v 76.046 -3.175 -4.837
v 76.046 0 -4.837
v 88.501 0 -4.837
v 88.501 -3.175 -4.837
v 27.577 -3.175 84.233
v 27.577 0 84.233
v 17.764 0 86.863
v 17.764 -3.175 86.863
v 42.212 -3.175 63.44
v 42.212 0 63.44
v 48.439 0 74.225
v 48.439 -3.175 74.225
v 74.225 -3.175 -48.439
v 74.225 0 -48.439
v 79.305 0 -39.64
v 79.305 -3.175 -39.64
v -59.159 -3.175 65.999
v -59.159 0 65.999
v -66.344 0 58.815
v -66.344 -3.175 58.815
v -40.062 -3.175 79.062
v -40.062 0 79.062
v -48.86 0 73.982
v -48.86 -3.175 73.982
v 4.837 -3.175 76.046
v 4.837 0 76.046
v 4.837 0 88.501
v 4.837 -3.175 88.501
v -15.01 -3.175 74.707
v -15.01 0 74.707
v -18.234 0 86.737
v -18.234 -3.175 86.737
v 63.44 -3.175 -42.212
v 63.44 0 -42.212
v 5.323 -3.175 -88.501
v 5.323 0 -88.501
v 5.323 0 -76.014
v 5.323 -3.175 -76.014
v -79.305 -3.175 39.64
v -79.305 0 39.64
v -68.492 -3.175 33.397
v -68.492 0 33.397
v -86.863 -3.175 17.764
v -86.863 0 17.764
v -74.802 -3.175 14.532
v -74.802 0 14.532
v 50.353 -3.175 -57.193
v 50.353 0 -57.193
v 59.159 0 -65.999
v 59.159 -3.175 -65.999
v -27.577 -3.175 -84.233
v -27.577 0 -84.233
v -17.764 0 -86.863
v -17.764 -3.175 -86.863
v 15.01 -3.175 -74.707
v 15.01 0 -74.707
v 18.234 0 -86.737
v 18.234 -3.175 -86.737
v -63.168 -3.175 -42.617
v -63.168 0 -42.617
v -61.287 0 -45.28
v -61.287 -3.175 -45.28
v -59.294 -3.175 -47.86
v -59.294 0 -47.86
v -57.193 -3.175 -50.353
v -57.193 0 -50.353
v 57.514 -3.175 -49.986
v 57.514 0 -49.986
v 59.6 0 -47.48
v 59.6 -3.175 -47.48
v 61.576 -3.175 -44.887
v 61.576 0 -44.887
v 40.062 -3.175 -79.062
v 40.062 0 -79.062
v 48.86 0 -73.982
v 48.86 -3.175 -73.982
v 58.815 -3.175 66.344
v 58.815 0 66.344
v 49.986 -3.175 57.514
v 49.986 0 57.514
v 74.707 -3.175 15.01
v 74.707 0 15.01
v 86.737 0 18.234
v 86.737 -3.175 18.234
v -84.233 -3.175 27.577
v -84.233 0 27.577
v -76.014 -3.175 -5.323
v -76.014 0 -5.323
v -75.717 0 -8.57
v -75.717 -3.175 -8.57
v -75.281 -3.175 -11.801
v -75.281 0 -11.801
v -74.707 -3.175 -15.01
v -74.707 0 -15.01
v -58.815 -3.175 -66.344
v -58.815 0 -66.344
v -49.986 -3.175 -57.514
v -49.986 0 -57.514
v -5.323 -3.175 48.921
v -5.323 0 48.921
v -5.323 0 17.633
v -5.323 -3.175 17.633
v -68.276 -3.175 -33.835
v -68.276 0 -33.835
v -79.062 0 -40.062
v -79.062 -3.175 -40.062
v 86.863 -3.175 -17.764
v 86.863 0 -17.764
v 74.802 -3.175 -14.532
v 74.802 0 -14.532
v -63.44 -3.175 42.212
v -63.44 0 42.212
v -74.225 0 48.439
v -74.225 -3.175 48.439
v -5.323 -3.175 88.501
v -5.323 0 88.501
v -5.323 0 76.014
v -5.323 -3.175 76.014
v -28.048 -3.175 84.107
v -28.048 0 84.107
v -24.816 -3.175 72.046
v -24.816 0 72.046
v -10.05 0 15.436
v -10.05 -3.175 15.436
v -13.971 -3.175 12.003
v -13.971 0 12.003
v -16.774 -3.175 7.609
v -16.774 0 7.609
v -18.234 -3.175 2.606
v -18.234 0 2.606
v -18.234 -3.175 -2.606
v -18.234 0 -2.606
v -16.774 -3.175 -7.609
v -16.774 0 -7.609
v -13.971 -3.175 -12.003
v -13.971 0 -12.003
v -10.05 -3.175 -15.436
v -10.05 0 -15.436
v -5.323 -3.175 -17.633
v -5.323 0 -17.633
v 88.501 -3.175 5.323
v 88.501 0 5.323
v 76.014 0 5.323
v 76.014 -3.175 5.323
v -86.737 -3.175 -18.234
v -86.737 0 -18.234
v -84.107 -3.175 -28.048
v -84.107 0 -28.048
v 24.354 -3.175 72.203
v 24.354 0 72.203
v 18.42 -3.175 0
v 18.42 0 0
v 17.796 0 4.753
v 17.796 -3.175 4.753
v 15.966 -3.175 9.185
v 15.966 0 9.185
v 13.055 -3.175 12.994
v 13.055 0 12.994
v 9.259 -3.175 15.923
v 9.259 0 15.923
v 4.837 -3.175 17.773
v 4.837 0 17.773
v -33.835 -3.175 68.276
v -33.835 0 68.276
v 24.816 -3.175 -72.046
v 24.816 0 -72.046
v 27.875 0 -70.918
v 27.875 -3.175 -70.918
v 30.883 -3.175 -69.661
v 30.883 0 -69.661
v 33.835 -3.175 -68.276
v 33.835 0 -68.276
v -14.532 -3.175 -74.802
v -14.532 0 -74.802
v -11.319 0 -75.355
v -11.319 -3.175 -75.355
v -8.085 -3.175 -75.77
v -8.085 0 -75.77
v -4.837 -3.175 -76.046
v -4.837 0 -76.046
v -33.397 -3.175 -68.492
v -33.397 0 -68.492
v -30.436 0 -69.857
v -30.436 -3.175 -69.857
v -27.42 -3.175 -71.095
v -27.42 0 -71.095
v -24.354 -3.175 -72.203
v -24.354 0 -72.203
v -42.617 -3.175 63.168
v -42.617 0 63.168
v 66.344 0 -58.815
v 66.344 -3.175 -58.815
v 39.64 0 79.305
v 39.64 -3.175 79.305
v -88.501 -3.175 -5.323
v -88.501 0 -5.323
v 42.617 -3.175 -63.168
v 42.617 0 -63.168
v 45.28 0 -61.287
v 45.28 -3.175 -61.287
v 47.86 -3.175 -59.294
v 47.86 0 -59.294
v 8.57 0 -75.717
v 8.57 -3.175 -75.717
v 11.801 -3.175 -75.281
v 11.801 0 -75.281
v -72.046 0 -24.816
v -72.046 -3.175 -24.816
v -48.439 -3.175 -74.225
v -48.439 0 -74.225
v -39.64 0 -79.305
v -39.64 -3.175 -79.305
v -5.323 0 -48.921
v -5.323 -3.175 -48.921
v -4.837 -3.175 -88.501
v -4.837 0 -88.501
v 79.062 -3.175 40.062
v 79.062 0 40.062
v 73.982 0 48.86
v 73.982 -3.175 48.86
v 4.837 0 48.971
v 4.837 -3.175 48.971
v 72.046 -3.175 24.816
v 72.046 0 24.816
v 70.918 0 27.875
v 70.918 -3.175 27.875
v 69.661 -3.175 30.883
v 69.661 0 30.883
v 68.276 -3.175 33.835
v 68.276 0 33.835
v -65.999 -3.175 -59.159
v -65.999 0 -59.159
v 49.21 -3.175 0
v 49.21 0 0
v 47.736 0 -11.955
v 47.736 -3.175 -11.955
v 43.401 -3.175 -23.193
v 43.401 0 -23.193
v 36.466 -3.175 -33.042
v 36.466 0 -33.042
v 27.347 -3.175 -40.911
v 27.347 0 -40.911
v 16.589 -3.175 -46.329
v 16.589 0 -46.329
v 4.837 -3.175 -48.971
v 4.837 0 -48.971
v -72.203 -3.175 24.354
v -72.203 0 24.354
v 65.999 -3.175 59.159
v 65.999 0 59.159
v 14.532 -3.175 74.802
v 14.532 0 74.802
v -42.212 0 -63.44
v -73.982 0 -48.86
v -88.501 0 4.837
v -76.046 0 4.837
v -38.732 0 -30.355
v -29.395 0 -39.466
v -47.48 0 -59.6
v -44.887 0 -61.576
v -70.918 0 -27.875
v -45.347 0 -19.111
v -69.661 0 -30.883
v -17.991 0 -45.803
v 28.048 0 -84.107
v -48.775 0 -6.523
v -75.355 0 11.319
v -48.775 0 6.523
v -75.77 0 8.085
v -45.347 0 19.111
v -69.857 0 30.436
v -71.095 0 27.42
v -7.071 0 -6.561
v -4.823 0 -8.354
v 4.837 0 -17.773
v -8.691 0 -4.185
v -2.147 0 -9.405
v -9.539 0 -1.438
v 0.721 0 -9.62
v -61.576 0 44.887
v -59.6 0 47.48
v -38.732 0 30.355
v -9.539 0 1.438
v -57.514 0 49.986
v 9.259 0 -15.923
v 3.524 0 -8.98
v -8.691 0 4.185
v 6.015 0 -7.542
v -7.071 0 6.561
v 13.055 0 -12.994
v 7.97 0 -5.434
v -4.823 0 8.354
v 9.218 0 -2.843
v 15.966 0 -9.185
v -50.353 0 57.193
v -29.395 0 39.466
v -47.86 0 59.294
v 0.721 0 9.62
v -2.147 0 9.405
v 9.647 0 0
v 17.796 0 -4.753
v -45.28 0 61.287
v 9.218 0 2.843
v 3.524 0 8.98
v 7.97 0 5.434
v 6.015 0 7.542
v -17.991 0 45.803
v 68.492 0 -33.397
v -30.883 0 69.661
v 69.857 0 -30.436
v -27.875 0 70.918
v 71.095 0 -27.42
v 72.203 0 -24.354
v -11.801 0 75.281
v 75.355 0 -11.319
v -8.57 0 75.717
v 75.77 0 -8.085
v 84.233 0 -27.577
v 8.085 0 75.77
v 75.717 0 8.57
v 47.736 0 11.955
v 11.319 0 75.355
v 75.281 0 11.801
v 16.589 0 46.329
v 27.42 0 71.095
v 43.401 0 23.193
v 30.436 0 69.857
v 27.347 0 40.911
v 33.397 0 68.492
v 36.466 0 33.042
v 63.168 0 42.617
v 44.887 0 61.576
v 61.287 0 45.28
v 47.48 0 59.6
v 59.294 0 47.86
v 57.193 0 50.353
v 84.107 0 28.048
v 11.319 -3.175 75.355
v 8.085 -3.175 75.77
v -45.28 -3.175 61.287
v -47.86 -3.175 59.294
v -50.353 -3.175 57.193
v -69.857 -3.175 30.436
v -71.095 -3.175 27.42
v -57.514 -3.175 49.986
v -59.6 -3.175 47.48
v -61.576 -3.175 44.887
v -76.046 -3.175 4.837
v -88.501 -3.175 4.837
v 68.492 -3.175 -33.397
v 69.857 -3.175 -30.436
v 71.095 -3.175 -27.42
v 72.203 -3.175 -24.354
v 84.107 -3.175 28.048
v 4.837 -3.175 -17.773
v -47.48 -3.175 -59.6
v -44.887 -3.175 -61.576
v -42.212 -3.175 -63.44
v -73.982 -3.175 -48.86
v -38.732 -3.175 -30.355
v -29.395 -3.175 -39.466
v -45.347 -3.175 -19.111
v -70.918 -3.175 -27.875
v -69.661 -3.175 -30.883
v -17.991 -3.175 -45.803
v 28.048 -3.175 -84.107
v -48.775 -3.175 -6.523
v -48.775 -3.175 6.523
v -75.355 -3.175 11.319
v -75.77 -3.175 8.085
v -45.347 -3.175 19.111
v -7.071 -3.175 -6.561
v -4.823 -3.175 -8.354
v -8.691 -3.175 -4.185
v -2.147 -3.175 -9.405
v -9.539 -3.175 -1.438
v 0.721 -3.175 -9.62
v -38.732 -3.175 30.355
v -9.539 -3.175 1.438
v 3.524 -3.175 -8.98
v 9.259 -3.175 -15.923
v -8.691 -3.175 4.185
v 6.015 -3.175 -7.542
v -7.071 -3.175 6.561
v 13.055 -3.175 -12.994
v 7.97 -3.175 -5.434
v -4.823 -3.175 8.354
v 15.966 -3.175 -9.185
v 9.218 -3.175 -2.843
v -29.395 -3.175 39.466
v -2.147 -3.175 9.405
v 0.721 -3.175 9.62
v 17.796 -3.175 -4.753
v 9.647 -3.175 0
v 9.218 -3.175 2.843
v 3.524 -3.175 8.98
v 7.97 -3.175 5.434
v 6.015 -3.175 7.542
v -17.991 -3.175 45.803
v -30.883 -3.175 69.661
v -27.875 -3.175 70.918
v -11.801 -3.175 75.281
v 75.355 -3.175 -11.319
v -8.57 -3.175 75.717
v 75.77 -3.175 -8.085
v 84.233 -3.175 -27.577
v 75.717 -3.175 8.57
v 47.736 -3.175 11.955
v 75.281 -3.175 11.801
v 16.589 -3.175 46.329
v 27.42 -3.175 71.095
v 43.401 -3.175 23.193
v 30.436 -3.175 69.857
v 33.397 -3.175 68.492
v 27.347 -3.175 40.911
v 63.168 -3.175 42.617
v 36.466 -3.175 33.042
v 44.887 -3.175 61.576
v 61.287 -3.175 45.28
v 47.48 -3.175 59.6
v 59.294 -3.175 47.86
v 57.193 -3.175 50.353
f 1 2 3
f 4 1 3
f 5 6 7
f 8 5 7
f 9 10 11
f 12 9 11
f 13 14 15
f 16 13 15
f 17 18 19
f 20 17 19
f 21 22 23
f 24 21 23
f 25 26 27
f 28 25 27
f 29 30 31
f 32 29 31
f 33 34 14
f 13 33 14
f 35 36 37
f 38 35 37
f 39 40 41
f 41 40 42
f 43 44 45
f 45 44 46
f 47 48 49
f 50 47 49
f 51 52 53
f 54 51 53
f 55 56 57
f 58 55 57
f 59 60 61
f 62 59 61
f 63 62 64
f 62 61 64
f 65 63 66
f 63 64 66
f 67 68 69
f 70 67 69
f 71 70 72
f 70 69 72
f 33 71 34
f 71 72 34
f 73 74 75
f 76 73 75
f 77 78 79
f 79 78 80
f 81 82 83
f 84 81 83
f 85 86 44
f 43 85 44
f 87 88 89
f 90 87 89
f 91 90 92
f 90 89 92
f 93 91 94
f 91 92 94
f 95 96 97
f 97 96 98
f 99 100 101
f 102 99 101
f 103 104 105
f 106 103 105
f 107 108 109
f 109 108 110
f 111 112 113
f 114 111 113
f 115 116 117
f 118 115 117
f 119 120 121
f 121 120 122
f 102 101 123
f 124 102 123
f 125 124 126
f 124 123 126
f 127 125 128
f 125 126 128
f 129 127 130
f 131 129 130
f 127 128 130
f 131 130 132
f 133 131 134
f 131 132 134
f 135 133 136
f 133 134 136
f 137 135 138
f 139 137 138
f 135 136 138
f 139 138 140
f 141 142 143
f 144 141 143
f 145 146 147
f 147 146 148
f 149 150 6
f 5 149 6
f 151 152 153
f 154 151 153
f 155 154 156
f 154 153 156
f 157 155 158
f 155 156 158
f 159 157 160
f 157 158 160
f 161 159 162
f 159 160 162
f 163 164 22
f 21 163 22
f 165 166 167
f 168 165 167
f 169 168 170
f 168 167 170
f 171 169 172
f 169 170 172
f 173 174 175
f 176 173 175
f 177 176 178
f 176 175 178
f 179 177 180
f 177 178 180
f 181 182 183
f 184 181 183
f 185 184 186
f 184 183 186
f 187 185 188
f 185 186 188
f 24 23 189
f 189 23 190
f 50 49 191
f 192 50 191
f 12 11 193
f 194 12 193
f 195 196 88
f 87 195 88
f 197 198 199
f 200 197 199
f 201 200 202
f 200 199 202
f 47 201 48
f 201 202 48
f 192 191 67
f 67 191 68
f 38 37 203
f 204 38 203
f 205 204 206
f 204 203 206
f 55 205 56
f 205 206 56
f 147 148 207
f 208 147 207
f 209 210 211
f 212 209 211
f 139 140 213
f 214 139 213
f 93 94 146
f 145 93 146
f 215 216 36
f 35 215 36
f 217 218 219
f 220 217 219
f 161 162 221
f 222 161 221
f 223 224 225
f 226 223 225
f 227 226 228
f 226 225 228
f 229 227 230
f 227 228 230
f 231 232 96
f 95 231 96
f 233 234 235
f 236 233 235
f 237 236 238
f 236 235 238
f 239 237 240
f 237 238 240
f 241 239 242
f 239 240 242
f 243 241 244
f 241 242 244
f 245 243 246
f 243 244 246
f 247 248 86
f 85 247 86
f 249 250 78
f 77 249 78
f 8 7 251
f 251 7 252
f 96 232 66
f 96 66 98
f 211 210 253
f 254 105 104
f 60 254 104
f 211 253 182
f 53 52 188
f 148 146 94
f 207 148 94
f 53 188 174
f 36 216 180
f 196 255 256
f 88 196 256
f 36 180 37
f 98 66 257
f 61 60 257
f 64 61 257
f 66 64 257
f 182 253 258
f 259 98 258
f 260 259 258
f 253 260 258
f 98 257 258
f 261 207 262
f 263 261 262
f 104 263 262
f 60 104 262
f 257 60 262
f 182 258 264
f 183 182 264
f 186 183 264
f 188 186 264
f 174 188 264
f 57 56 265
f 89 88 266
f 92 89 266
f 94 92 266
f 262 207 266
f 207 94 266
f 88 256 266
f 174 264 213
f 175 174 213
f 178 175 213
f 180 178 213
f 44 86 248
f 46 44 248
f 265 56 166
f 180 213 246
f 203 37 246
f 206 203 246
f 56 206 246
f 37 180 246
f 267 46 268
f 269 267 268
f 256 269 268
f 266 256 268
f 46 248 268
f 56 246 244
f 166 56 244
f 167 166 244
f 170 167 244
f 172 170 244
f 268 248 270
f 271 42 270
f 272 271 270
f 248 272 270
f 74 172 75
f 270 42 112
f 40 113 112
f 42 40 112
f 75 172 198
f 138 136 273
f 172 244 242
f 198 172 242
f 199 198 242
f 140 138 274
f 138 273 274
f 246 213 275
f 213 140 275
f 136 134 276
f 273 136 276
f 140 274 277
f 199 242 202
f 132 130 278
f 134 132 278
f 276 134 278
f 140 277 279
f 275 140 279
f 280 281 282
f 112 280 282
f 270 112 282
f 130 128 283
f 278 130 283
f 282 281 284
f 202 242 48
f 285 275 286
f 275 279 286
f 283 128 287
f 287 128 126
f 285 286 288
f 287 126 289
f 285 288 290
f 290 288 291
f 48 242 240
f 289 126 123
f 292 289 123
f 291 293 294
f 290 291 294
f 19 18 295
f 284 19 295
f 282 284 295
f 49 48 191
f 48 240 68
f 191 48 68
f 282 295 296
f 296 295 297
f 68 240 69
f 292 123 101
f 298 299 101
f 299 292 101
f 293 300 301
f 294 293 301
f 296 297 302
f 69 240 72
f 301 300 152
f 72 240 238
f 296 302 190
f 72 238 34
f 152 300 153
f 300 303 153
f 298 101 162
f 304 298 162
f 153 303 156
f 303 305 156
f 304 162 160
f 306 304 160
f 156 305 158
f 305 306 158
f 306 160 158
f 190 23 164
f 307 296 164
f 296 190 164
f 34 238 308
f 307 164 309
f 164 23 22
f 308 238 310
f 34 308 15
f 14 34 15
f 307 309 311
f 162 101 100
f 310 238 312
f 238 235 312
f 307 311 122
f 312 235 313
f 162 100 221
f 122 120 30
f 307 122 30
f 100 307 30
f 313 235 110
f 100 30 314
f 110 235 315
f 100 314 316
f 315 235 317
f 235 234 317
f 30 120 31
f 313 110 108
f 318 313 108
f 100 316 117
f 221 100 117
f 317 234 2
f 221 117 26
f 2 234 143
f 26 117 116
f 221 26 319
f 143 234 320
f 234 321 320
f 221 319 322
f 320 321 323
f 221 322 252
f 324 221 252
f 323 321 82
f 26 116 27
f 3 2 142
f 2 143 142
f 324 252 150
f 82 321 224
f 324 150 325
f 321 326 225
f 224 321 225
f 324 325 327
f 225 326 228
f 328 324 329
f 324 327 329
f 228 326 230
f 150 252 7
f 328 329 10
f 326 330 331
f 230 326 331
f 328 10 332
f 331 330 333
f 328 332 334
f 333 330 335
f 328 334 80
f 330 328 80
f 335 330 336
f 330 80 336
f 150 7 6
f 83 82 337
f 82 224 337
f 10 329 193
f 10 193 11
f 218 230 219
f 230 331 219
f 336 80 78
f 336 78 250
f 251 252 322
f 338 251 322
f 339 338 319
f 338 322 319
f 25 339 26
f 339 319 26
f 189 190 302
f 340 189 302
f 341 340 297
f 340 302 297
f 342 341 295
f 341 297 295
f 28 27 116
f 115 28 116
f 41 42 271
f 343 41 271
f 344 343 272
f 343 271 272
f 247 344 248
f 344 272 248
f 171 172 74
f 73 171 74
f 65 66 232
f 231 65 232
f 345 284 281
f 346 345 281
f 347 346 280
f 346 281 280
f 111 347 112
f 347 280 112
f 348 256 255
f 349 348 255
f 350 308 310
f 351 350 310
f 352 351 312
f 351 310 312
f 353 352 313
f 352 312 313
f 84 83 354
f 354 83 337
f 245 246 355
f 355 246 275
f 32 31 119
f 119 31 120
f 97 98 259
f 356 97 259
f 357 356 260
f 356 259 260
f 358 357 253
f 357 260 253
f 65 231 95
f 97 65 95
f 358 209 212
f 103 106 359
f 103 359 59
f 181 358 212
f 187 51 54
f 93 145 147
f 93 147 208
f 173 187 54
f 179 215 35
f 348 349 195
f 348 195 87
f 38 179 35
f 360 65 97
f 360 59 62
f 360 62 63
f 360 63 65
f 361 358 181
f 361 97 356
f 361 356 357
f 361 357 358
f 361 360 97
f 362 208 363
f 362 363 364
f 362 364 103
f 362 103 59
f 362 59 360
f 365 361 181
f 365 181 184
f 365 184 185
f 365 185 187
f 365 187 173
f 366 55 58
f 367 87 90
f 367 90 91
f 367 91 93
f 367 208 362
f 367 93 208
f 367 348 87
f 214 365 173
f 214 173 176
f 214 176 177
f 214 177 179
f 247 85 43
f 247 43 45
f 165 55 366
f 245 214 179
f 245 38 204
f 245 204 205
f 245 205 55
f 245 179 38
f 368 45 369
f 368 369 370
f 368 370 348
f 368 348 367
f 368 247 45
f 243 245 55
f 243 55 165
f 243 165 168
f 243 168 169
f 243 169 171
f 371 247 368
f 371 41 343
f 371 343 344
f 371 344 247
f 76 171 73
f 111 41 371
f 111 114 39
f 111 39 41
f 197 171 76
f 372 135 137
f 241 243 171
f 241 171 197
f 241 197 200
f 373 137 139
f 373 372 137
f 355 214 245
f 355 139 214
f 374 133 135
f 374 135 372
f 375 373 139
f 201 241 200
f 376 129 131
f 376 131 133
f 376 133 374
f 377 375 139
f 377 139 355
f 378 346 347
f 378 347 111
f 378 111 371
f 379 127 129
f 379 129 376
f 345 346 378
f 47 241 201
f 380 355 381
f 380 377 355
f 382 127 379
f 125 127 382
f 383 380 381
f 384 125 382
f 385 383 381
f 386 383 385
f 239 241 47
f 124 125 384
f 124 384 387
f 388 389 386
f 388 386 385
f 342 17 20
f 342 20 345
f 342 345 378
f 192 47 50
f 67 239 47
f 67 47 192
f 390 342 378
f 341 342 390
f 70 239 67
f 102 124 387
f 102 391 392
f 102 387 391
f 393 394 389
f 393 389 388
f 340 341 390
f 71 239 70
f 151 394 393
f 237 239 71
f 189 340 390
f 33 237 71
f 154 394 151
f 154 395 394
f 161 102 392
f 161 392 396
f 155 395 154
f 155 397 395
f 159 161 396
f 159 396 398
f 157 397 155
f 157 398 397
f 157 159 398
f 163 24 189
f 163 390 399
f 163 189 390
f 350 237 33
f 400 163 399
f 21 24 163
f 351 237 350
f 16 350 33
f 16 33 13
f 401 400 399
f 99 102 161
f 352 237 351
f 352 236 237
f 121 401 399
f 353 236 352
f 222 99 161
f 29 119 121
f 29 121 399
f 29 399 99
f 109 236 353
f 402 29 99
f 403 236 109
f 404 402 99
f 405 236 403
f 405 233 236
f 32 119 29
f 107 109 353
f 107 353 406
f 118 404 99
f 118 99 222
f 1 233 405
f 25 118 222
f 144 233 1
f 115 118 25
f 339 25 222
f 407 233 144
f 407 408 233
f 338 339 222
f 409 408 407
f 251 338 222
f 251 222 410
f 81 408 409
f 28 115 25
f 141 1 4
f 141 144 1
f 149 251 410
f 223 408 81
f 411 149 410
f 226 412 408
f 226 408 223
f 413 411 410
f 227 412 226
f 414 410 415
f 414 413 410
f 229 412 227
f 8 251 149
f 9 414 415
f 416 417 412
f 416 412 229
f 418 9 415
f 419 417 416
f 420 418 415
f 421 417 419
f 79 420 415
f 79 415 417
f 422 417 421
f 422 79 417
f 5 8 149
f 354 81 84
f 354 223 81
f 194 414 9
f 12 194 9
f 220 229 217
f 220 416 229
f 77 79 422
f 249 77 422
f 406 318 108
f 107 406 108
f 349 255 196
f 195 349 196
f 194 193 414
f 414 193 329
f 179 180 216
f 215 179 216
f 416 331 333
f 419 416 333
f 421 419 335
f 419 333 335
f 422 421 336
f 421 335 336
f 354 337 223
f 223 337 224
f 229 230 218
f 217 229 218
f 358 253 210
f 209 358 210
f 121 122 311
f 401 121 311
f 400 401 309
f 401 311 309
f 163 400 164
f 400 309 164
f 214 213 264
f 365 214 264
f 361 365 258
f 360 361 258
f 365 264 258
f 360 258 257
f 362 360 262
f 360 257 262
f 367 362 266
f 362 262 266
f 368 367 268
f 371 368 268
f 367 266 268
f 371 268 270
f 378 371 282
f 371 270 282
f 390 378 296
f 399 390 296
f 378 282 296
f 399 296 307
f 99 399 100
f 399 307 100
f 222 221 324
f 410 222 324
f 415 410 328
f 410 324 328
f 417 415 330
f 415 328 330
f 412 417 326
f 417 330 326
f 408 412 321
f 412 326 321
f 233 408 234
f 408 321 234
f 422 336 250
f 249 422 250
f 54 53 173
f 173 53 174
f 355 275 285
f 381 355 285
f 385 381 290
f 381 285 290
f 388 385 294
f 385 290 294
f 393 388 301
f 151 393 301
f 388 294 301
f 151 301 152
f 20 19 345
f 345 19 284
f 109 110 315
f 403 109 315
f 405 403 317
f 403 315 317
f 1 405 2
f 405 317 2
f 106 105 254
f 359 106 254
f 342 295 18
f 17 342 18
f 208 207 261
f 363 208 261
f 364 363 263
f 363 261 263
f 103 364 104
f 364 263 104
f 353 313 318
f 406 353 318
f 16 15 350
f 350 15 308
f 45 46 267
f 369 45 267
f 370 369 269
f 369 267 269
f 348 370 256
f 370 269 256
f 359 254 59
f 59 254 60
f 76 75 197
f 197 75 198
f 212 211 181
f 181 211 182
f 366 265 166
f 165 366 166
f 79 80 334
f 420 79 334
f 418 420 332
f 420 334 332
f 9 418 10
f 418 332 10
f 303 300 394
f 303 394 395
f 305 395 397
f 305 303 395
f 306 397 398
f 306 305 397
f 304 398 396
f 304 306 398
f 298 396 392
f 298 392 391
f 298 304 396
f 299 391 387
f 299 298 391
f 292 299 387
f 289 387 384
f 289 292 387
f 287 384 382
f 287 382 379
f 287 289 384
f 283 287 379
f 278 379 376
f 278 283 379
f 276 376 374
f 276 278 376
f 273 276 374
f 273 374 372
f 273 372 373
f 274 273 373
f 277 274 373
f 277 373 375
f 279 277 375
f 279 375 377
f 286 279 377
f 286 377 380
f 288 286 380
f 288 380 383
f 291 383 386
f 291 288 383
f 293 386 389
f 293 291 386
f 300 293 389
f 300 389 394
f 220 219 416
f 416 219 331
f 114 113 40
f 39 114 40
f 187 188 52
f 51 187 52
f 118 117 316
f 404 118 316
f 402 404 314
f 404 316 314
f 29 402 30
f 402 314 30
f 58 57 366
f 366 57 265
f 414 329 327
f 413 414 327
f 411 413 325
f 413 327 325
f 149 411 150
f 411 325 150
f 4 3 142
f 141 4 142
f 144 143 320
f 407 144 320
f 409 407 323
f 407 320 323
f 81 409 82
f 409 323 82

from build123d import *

# Parameters (mm, degrees)
F0_R     = 9.6465824974
F1_DEPTH = 3.175


with BuildPart() as f1:
    # F0 (on Front) → F1 (new body)
    with BuildSketch(Plane.XZ):
        with BuildLine():
            ThreePointArc((4.8366556875, 76.0463461434), (-0.2438868924, 76.1996097049), (-5.3233443125, 76.0138277245))
            ThreePointArc((-5.3233443125, 76.0138277245), (-10.1878453097, 75.5158778532), (-15.0103920509, 74.7069483414))
            ThreePointArc((-15.0103920509, 74.7069483414), (-19.9574868691, 73.5400483945), (-24.8157820599, 72.0459364625))
            ThreePointArc((-24.8157820599, 72.0459364625), (-29.3856502949, 70.3059283186), (-33.8345063769, 68.2763954689))
            ThreePointArc((-33.8345063769, 68.2763954689), (-38.311017097, 65.8688543167), (-42.6170652699, 63.1682336921))
            ThreePointArc((-42.6170652699, 63.1682336921), (-46.5808717746, 60.3047459551), (-50.3528550075, 57.1929190774))
            ThreePointArc((-50.3528550075, 57.1929190774), (-54.0537148216, 53.7088066706), (-57.5140659099, 49.985720186))
            ThreePointArc((-57.5140659099, 49.985720186), (-60.6016838214, 46.1938948131), (-63.4397397814, 42.2118397665))
            ThreePointArc((-63.4397397814, 42.2118397665), (-66.1127412091, 37.888592608), (-68.4915780045, 33.3967624546))
            ThreePointArc((-68.4915780045, 33.3967624546), (-70.4925912648, 28.9350060786), (-72.2033111283, 24.3540933338))
            ThreePointArc((-72.2033111283, 24.3540933338), (-73.6662935398, 19.4863335729), (-74.8015022459, 14.5318705526))
            ThreePointArc((-74.8015022459, 14.5318705526), (-75.579545108, 9.7042444972), (-76.0463461434, 4.8366556875))
            ThreePointArc((-76.0463461434, 4.8366556875), (-76.1996097049, -0.2438868924), (-76.0138277245, -5.3233443125))
            ThreePointArc((-76.0138277245, -5.3233443125), (-75.5158778532, -10.1878453097), (-74.7069483414, -15.0103920509))
            ThreePointArc((-74.7069483414, -15.0103920509), (-73.5400483945, -19.9574868691), (-72.0459364625, -24.8157820599))
            ThreePointArc((-72.0459364625, -24.8157820599), (-70.3059283186, -29.3856502949), (-68.2763954689, -33.8345063769))
            ThreePointArc((-68.2763954689, -33.8345063769), (-65.8688543167, -38.311017097), (-63.1682336921, -42.6170652699))
            ThreePointArc((-63.1682336921, -42.6170652699), (-60.3047459551, -46.5808717746), (-57.1929190774, -50.3528550075))
            ThreePointArc((-57.1929190774, -50.3528550075), (-53.7088066706, -54.0537148216), (-49.985720186, -57.5140659099))
            ThreePointArc((-49.985720186, -57.5140659099), (-46.1938948131, -60.6016838214), (-42.2118397665, -63.4397397814))
            ThreePointArc((-42.2118397665, -63.4397397814), (-37.888592608, -66.1127412091), (-33.3967624546, -68.4915780045))
            ThreePointArc((-33.3967624546, -68.4915780045), (-28.9350060786, -70.4925912648), (-24.3540933338, -72.2033111283))
            ThreePointArc((-24.3540933338, -72.2033111283), (-19.4863335729, -73.6662935398), (-14.5318705526, -74.8015022459))
            ThreePointArc((-14.5318705526, -74.8015022459), (-9.7042444972, -75.579545108), (-4.8366556875, -76.0463461434))
            ThreePointArc((-4.8366556875, -76.0463461434), (0.2438868924, -76.1996097049), (5.3233443125, -76.0138277245))
            ThreePointArc((5.3233443125, -76.0138277245), (10.1878453097, -75.5158778532), (15.0103920509, -74.7069483414))
            ThreePointArc((15.0103920509, -74.7069483414), (19.9574868691, -73.5400483945), (24.8157820599, -72.0459364625))
            ThreePointArc((24.8157820599, -72.0459364625), (29.3856502949, -70.3059283186), (33.8345063769, -68.2763954689))
            ThreePointArc((33.8345063769, -68.2763954689), (38.311017097, -65.8688543167), (42.6170652699, -63.1682336921))
            ThreePointArc((42.6170652699, -63.1682336921), (46.5808717746, -60.3047459551), (50.3528550075, -57.1929190774))
            ThreePointArc((50.3528550075, -57.1929190774), (54.0537148216, -53.7088066706), (57.5140659099, -49.985720186))
            ThreePointArc((57.5140659099, -49.985720186), (60.6016838214, -46.1938948131), (63.4397397814, -42.2118397665))
            ThreePointArc((63.4397397814, -42.2118397665), (66.1127412091, -37.888592608), (68.4915780045, -33.3967624546))
            ThreePointArc((68.4915780045, -33.3967624546), (70.4925912648, -28.9350060786), (72.2033111283, -24.3540933338))
            ThreePointArc((72.2033111283, -24.3540933338), (73.6662935398, -19.4863335729), (74.8015022459, -14.5318705526))
            ThreePointArc((74.8015022459, -14.5318705526), (75.579545108, -9.7042444972), (76.0463461434, -4.8366556875))
            ThreePointArc((76.0463461434, -4.8366556875), (76.1615768486, -2.4195478786), (76.2, 0))
            ThreePointArc((76.2, 0), (76.1534427082, 2.6632994004), (76.0138277245, 5.3233443125))
            ThreePointArc((76.0138277245, 5.3233443125), (75.5158778532, 10.1878453097), (74.7069483414, 15.0103920509))
            ThreePointArc((74.7069483414, 15.0103920509), (73.5400483945, 19.9574868691), (72.0459364625, 24.8157820599))
            ThreePointArc((72.0459364625, 24.8157820599), (70.3059283186, 29.3856502949), (68.2763954689, 33.8345063769))
            ThreePointArc((68.2763954689, 33.8345063769), (65.8688543167, 38.311017097), (63.1682336921, 42.6170652699))
            ThreePointArc((63.1682336921, 42.6170652699), (60.3047459551, 46.5808717746), (57.1929190774, 50.3528550075))
            ThreePointArc((57.1929190774, 50.3528550075), (53.7088066706, 54.0537148216), (49.985720186, 57.5140659099))
            ThreePointArc((49.985720186, 57.5140659099), (46.1938948131, 60.6016838214), (42.2118397665, 63.4397397814))
            ThreePointArc((42.2118397665, 63.4397397814), (37.888592608, 66.1127412091), (33.3967624546, 68.4915780045))
            ThreePointArc((33.3967624546, 68.4915780045), (28.9350060786, 70.4925912648), (24.3540933338, 72.2033111283))
            ThreePointArc((24.3540933338, 72.2033111283), (19.4863335729, 73.6662935398), (14.5318705526, 74.8015022459))
            ThreePointArc((14.5318705526, 74.8015022459), (9.7042444972, 75.579545108), (4.8366556875, 76.0463461434))
        make_face()
        with BuildLine():
            ThreePointArc((-5.3233443125, 48.920956801), (-0.2446514329, 49.2091267416), (4.8366556875, 48.9714689463))
            ThreePointArc((4.8366556875, 48.9714689463), (36.4664815494, 33.0423021656), (49.2097349007, 0))
            ThreePointArc((49.2097349007, 0), (36.4664815494, -33.0423021656), (4.8366556875, -48.9714689463))
            ThreePointArc((4.8366556875, -48.9714689463), (-0.2446514329, -49.2091267416), (-5.3233443125, -48.920956801))
            ThreePointArc((-5.3233443125, -48.920956801), (-49.2097349007, 0), (-5.3233443125, 48.920956801))
        make_face(mode=Mode.SUBTRACT)
        with BuildLine():
            ThreePointArc((4.8366556875, -17.7731514304), (14.6350085707, -11.1845730424), (18.4195046081, 0))
            ThreePointArc((18.4195046081, 0), (14.6350085707, 11.1845730424), (4.8366556875, 17.7731514304))
            ThreePointArc((4.8366556875, 17.7731514304), (-0.2531647989, 18.4177647284), (-5.3233443125, 17.6334952672))
            ThreePointArc((-5.3233443125, 17.6334952672), (-18.4195046081, 0), (-5.3233443125, -17.6334952672))
            ThreePointArc((-5.3233443125, -17.6334952672), (-0.2531647989, -18.4177647284), (4.8366556875, -17.7731514304))
        make_face()
        Circle(F0_R, mode=Mode.SUBTRACT)
        with BuildLine():
            ThreePointArc((-5.3233443125, 17.6334952672), (-0.2531647989, 18.4177647284), (4.8366556875, 17.7731514304))
            Line((4.8366556875, 17.7731514304), (4.8366556875, 48.9714689463))
            ThreePointArc((4.8366556875, 48.9714689463), (-0.2446514329, 49.2091267416), (-5.3233443125, 48.920956801))
            Line((-5.3233443125, 48.920956801), (-5.3233443125, 17.6334952672))
        make_face()
        with BuildLine():
            Line((4.8366556875, -48.9714689463), (4.8366556875, -17.7731514304))
            ThreePointArc((4.8366556875, -17.7731514304), (-0.2531647989, -18.4177647284), (-5.3233443125, -17.6334952672))
            Line((-5.3233443125, -17.6334952672), (-5.3233443125, -48.920956801))
            ThreePointArc((-5.3233443125, -48.920956801), (-0.2446514329, -49.2091267416), (4.8366556875, -48.9714689463))
        make_face()
        with BuildLine():
            ThreePointArc((5.3233443125, -76.0138277245), (0.2438868924, -76.1996097049), (-4.8366556875, -76.0463461434))
            Line((-4.8366556875, -76.0463461434), (-4.8366556875, -88.5005375114))
            Line((-4.8366556875, -88.5005375114), (5.3233443125, -88.5005375114))
            Line((5.3233443125, -88.5005375114), (5.3233443125, -76.0138277245))
        make_face()
        with BuildLine():
            Line((28.0475803634, -84.107171931), (24.8157820599, -72.0459364625))
            ThreePointArc((24.8157820599, -72.0459364625), (19.9574868691, -73.5400483945), (15.0103920509, -74.7069483414))
            Line((15.0103920509, -74.7069483414), (18.2337739683, -86.7367734293))
            Line((18.2337739683, -86.7367734293), (28.0475803634, -84.107171931))
        make_face()
        with BuildLine():
            Line((48.8604201634, -73.9820415772), (42.6170652699, -63.1682336921))
            ThreePointArc((42.6170652699, -63.1682336921), (38.311017097, -65.8688543167), (33.8345063769, -68.2763954689))
            Line((33.8345063769, -68.2763954689), (40.0616020609, -79.0620415772))
            Line((40.0616020609, -79.0620415772), (48.8604201634, -73.9820415772))
        make_face()
        with BuildLine():
            Line((66.3435030749, -58.815157351), (57.5140659099, -49.985720186))
            ThreePointArc((57.5140659099, -49.985720186), (54.0537148216, -53.7088066706), (50.3528550075, -57.1929190774))
            Line((50.3528550075, -57.1929190774), (59.1592981781, -65.9993622479))
            Line((59.1592981781, -65.9993622479), (66.3435030749, -58.815157351))
        make_face()
        with BuildLine():
            Line((79.3053858897, -39.640117348), (68.4915780045, -33.3967624546))
            ThreePointArc((68.4915780045, -33.3967624546), (66.1127412091, -37.888592608), (63.4397397814, -42.2118397665))
            Line((63.4397397814, -42.2118397665), (74.2253858897, -48.4389354505))
            Line((74.2253858897, -48.4389354505), (79.3053858897, -39.640117348))
        make_face()
        with BuildLine():
            Line((86.8627377144, -17.7636688561), (74.8015022459, -14.5318705526))
            ThreePointArc((74.8015022459, -14.5318705526), (73.6662935398, -19.4863335729), (72.2033111283, -24.3540933338))
            Line((72.2033111283, -24.3540933338), (84.2331362162, -27.5774752512))
            Line((84.2331362162, -27.5774752512), (86.8627377144, -17.7636688561))
        make_face()
        with BuildLine():
            Line((88.5005375114, 5.3233443125), (76.0138277245, 5.3233443125))
            ThreePointArc((76.0138277245, 5.3233443125), (76.1534427082, 2.6632994004), (76.2, 0))
            ThreePointArc((76.2, 0), (76.1615768486, -2.4195478786), (76.0463461434, -4.8366556875))
            Line((76.0463461434, -4.8366556875), (88.5005375114, -4.8366556875))
            Line((88.5005375114, -4.8366556875), (88.5005375114, 5.3233443125))
        make_face()
        with BuildLine():
            Line((84.107171931, 28.0475803634), (72.0459364625, 24.8157820599))
            ThreePointArc((72.0459364625, 24.8157820599), (73.5400483945, 19.9574868691), (74.7069483414, 15.0103920509))
            Line((74.7069483414, 15.0103920509), (86.7367734293, 18.2337739683))
            Line((86.7367734293, 18.2337739683), (84.107171931, 28.0475803634))
        make_face()
        with BuildLine():
            Line((73.9820415772, 48.8604201634), (63.1682336921, 42.6170652699))
            ThreePointArc((63.1682336921, 42.6170652699), (65.8688543167, 38.311017097), (68.2763954689, 33.8345063769))
            Line((68.2763954689, 33.8345063769), (79.0620415772, 40.0616020609))
            Line((79.0620415772, 40.0616020609), (73.9820415772, 48.8604201634))
        make_face()
        with BuildLine():
            Line((39.640117348, 79.3053858897), (33.3967624546, 68.4915780045))
            ThreePointArc((33.3967624546, 68.4915780045), (37.888592608, 66.1127412091), (42.2118397665, 63.4397397814))
            Line((42.2118397665, 63.4397397814), (48.4389354505, 74.2253858897))
            Line((48.4389354505, 74.2253858897), (39.640117348, 79.3053858897))
        make_face()
        with BuildLine():
            Line((17.7636688561, 86.8627377144), (14.5318705526, 74.8015022459))
            ThreePointArc((14.5318705526, 74.8015022459), (19.4863335729, 73.6662935398), (24.3540933338, 72.2033111283))
            Line((24.3540933338, 72.2033111283), (27.5774752512, 84.2331362162))
            Line((27.5774752512, 84.2331362162), (17.7636688561, 86.8627377144))
        make_face()
        with BuildLine():
            Line((58.815157351, 66.3435030749), (49.985720186, 57.5140659099))
            ThreePointArc((49.985720186, 57.5140659099), (53.7088066706, 54.0537148216), (57.1929190774, 50.3528550075))
            Line((57.1929190774, 50.3528550075), (65.9993622479, 59.1592981781))
            Line((65.9993622479, 59.1592981781), (58.815157351, 66.3435030749))
        make_face()
        with BuildLine():
            Line((-5.3233443125, 88.5005375114), (-5.3233443125, 76.0138277245))
            ThreePointArc((-5.3233443125, 76.0138277245), (-0.2438868924, 76.1996097049), (4.8366556875, 76.0463461434))
            Line((4.8366556875, 76.0463461434), (4.8366556875, 88.5005375114))
            Line((4.8366556875, 88.5005375114), (-5.3233443125, 88.5005375114))
        make_face()
        with BuildLine():
            ThreePointArc((-24.8157820599, 72.0459364625), (-19.9574868691, 73.5400483945), (-15.0103920509, 74.7069483414))
            Line((-15.0103920509, 74.7069483414), (-18.2337739683, 86.7367734293))
            Line((-18.2337739683, 86.7367734293), (-28.0475803634, 84.107171931))
            Line((-28.0475803634, 84.107171931), (-24.8157820599, 72.0459364625))
        make_face()
        with BuildLine():
            ThreePointArc((-42.6170652699, 63.1682336921), (-38.311017097, 65.8688543167), (-33.8345063769, 68.2763954689))
            Line((-33.8345063769, 68.2763954689), (-40.0616020609, 79.0620415772))
            Line((-40.0616020609, 79.0620415772), (-48.8604201634, 73.9820415772))
            Line((-48.8604201634, 73.9820415772), (-42.6170652699, 63.1682336921))
        make_face()
        with BuildLine():
            ThreePointArc((-57.5140659099, 49.985720186), (-54.0537148216, 53.7088066706), (-50.3528550075, 57.1929190774))
            Line((-50.3528550075, 57.1929190774), (-59.1592981781, 65.9993622479))
            Line((-59.1592981781, 65.9993622479), (-66.3435030749, 58.815157351))
            Line((-66.3435030749, 58.815157351), (-57.5140659099, 49.985720186))
        make_face()
        with BuildLine():
            ThreePointArc((-68.4915780045, 33.3967624546), (-66.1127412091, 37.888592608), (-63.4397397814, 42.2118397665))
            Line((-63.4397397814, 42.2118397665), (-74.2253858897, 48.4389354505))
            Line((-74.2253858897, 48.4389354505), (-79.3053858897, 39.640117348))
            Line((-79.3053858897, 39.640117348), (-68.4915780045, 33.3967624546))
        make_face()
        with BuildLine():
            ThreePointArc((-74.8015022459, 14.5318705526), (-73.6662935398, 19.4863335729), (-72.2033111283, 24.3540933338))
            Line((-72.2033111283, 24.3540933338), (-84.2331362162, 27.5774752512))
            Line((-84.2331362162, 27.5774752512), (-86.8627377144, 17.7636688561))
            Line((-86.8627377144, 17.7636688561), (-74.8015022459, 14.5318705526))
        make_face()
        with BuildLine():
            ThreePointArc((-76.0138277245, -5.3233443125), (-76.1996097049, -0.2438868924), (-76.0463461434, 4.8366556875))
            Line((-76.0463461434, 4.8366556875), (-88.5005375114, 4.8366556875))
            Line((-88.5005375114, 4.8366556875), (-88.5005375114, -5.3233443125))
            Line((-88.5005375114, -5.3233443125), (-76.0138277245, -5.3233443125))
        make_face()
        with BuildLine():
            ThreePointArc((-72.0459364625, -24.8157820599), (-73.5400483945, -19.9574868691), (-74.7069483414, -15.0103920509))
            Line((-74.7069483414, -15.0103920509), (-86.7367734293, -18.2337739683))
            Line((-86.7367734293, -18.2337739683), (-84.107171931, -28.0475803634))
            Line((-84.107171931, -28.0475803634), (-72.0459364625, -24.8157820599))
        make_face()
        with BuildLine():
            ThreePointArc((-63.1682336921, -42.6170652699), (-65.8688543167, -38.311017097), (-68.2763954689, -33.8345063769))
            Line((-68.2763954689, -33.8345063769), (-79.0620415772, -40.0616020609))
            Line((-79.0620415772, -40.0616020609), (-73.9820415772, -48.8604201634))
            Line((-73.9820415772, -48.8604201634), (-63.1682336921, -42.6170652699))
        make_face()
        with BuildLine():
            ThreePointArc((-49.985720186, -57.5140659099), (-53.7088066706, -54.0537148216), (-57.1929190774, -50.3528550075))
            Line((-57.1929190774, -50.3528550075), (-65.9993622479, -59.1592981781))
            Line((-65.9993622479, -59.1592981781), (-58.815157351, -66.3435030749))
            Line((-58.815157351, -66.3435030749), (-49.985720186, -57.5140659099))
        make_face()
        with BuildLine():
            ThreePointArc((-33.3967624546, -68.4915780045), (-37.888592608, -66.1127412091), (-42.2118397665, -63.4397397814))
            Line((-42.2118397665, -63.4397397814), (-48.4389354505, -74.2253858897))
            Line((-48.4389354505, -74.2253858897), (-39.640117348, -79.3053858897))
            Line((-39.640117348, -79.3053858897), (-33.3967624546, -68.4915780045))
        make_face()
        with BuildLine():
            ThreePointArc((-14.5318705526, -74.8015022459), (-19.4863335729, -73.6662935398), (-24.3540933338, -72.2033111283))
            Line((-24.3540933338, -72.2033111283), (-27.5774752512, -84.2331362162))
            Line((-27.5774752512, -84.2331362162), (-17.7636688561, -86.8627377144))
            Line((-17.7636688561, -86.8627377144), (-14.5318705526, -74.8015022459))
        make_face()
    extrude(amount=F1_DEPTH)


solid = f1.part
